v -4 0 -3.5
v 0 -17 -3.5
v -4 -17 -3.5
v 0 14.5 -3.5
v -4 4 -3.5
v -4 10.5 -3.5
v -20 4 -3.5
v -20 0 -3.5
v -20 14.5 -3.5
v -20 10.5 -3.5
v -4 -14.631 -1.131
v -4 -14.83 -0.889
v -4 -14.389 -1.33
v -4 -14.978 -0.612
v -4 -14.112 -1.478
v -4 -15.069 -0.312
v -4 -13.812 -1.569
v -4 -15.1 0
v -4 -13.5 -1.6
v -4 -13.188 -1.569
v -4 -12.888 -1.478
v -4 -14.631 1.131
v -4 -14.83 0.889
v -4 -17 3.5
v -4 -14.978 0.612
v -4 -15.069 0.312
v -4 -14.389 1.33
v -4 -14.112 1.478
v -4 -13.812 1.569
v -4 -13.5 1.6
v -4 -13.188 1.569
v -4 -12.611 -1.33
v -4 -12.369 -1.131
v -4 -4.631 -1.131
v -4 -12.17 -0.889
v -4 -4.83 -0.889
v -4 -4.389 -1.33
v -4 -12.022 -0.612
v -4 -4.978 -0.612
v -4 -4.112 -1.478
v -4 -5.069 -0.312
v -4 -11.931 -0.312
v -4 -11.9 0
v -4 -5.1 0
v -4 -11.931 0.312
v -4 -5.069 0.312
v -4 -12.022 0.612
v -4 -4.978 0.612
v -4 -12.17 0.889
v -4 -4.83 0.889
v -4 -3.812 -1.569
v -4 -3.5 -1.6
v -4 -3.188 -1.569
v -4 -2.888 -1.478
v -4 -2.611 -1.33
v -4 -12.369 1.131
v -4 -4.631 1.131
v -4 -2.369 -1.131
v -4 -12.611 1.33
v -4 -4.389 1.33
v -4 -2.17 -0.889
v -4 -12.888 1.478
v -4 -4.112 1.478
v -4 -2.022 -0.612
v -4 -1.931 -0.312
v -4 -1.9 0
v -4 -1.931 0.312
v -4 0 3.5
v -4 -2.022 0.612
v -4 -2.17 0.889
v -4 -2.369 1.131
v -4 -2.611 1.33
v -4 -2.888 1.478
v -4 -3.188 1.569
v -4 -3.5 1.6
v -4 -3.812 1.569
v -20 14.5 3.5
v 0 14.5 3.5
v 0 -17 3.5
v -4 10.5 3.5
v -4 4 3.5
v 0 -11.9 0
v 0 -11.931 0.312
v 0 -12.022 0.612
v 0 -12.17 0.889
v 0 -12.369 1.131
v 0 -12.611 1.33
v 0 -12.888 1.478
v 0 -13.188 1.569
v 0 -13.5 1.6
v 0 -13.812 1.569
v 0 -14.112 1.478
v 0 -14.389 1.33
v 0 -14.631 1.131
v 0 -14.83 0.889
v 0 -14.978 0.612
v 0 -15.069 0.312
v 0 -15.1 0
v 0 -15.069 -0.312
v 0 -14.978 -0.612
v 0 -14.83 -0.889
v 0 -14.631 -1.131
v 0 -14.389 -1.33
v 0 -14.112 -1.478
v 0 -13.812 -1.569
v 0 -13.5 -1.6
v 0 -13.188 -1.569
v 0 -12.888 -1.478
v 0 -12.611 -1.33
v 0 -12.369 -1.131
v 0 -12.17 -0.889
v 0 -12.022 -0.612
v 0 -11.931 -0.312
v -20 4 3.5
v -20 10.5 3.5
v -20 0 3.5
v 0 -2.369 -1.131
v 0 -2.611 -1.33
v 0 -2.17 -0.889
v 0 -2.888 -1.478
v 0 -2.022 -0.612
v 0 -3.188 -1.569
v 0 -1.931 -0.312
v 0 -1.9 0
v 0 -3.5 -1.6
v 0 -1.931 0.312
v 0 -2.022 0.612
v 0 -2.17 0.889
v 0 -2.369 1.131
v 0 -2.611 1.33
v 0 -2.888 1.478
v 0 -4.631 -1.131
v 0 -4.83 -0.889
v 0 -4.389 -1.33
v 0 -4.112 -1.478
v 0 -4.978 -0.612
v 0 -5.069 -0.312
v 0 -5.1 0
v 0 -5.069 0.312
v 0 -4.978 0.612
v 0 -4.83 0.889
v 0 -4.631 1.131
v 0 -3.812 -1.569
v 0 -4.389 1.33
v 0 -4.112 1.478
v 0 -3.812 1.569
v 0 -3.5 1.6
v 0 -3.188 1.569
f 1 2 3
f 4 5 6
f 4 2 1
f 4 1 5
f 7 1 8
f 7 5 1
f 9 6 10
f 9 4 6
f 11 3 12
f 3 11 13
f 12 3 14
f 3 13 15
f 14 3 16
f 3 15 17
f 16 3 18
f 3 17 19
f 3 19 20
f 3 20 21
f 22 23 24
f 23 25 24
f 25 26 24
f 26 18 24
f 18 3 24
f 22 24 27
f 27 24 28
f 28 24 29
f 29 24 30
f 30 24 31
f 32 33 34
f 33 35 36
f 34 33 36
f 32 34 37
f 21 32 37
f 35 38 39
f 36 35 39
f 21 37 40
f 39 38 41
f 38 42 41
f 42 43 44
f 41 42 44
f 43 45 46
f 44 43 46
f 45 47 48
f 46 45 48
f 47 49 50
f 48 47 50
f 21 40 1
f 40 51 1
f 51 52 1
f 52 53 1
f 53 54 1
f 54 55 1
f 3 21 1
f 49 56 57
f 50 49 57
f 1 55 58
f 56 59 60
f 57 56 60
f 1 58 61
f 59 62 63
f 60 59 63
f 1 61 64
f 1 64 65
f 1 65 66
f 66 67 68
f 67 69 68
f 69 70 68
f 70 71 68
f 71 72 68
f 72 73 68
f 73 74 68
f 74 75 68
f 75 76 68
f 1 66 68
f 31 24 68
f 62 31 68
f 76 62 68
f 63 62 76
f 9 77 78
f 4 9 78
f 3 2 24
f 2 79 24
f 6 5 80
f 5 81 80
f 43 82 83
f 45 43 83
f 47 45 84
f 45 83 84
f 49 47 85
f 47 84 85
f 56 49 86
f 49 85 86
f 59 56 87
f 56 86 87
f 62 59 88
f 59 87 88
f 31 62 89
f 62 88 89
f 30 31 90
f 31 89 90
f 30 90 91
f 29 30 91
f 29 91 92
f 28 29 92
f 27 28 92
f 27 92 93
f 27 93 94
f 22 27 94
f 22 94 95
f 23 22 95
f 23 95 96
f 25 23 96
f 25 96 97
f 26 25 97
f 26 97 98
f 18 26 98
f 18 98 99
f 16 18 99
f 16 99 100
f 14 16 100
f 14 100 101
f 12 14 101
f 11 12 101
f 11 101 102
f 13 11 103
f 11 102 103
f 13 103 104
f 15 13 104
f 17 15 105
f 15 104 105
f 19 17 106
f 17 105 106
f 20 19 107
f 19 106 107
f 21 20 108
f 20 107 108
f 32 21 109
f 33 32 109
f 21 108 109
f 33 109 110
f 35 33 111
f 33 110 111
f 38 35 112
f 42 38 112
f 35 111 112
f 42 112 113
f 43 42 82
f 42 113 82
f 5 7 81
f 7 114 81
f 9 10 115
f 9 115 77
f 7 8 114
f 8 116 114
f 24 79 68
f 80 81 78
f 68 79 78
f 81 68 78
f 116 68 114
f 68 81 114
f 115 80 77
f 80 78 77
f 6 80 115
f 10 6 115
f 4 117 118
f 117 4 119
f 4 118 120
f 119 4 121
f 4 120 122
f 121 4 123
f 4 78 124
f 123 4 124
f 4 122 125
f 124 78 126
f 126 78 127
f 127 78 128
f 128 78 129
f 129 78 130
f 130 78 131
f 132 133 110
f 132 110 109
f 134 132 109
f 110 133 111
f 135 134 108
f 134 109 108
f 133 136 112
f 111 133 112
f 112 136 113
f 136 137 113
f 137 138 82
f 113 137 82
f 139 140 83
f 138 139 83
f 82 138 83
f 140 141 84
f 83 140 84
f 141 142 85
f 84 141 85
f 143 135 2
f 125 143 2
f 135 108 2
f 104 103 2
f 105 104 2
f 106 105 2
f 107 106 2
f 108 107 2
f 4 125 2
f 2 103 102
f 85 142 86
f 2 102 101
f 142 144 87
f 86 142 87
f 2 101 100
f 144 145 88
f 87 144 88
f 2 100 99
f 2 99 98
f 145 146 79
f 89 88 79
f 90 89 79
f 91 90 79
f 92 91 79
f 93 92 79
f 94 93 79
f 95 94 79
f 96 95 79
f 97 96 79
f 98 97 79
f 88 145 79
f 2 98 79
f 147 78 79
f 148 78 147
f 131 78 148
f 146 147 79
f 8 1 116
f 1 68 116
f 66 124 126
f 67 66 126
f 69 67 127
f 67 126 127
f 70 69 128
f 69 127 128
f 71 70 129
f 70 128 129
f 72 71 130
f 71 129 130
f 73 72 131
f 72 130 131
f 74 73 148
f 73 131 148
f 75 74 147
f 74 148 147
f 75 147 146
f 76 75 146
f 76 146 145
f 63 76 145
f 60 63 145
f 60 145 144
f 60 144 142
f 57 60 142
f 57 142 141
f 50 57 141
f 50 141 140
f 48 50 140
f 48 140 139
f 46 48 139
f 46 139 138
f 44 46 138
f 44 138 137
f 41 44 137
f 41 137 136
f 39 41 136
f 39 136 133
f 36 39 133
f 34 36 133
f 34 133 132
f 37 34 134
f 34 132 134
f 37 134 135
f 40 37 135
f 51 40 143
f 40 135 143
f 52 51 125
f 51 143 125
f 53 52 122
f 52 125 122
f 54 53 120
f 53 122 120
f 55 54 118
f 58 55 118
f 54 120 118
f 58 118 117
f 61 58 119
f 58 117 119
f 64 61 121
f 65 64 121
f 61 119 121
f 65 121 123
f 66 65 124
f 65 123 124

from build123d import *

# Parameters (mm, degrees)
PAD_DEPTH    = 3.5
SKETCH001_R  = 1.6
POCKET_DEPTH = 20.001


with BuildPart() as part:
    # Sketch → Pad (new body, symmetric)
    with BuildSketch(Plane.XY):
        Polygon((-20, 14.5), (0, 14.5), (0, -17), (-4, -17), (-4, 0), (-20, 0), (-20, 4), (-4, 4), (-4, 10.5), (-20, 10.5), align=None)
    extrude(amount=PAD_DEPTH, both=True)

    # Sketch001 → Pocket (cut, through all)
    with BuildSketch(Plane.YZ):
        with Locations((-3.5, 0)):
            Circle(SKETCH001_R)
        with Locations((-13.5, 0)):
            Circle(SKETCH001_R)
    extrude(amount=-POCKET_DEPTH, mode=Mode.SUBTRACT)


solid = part.part
